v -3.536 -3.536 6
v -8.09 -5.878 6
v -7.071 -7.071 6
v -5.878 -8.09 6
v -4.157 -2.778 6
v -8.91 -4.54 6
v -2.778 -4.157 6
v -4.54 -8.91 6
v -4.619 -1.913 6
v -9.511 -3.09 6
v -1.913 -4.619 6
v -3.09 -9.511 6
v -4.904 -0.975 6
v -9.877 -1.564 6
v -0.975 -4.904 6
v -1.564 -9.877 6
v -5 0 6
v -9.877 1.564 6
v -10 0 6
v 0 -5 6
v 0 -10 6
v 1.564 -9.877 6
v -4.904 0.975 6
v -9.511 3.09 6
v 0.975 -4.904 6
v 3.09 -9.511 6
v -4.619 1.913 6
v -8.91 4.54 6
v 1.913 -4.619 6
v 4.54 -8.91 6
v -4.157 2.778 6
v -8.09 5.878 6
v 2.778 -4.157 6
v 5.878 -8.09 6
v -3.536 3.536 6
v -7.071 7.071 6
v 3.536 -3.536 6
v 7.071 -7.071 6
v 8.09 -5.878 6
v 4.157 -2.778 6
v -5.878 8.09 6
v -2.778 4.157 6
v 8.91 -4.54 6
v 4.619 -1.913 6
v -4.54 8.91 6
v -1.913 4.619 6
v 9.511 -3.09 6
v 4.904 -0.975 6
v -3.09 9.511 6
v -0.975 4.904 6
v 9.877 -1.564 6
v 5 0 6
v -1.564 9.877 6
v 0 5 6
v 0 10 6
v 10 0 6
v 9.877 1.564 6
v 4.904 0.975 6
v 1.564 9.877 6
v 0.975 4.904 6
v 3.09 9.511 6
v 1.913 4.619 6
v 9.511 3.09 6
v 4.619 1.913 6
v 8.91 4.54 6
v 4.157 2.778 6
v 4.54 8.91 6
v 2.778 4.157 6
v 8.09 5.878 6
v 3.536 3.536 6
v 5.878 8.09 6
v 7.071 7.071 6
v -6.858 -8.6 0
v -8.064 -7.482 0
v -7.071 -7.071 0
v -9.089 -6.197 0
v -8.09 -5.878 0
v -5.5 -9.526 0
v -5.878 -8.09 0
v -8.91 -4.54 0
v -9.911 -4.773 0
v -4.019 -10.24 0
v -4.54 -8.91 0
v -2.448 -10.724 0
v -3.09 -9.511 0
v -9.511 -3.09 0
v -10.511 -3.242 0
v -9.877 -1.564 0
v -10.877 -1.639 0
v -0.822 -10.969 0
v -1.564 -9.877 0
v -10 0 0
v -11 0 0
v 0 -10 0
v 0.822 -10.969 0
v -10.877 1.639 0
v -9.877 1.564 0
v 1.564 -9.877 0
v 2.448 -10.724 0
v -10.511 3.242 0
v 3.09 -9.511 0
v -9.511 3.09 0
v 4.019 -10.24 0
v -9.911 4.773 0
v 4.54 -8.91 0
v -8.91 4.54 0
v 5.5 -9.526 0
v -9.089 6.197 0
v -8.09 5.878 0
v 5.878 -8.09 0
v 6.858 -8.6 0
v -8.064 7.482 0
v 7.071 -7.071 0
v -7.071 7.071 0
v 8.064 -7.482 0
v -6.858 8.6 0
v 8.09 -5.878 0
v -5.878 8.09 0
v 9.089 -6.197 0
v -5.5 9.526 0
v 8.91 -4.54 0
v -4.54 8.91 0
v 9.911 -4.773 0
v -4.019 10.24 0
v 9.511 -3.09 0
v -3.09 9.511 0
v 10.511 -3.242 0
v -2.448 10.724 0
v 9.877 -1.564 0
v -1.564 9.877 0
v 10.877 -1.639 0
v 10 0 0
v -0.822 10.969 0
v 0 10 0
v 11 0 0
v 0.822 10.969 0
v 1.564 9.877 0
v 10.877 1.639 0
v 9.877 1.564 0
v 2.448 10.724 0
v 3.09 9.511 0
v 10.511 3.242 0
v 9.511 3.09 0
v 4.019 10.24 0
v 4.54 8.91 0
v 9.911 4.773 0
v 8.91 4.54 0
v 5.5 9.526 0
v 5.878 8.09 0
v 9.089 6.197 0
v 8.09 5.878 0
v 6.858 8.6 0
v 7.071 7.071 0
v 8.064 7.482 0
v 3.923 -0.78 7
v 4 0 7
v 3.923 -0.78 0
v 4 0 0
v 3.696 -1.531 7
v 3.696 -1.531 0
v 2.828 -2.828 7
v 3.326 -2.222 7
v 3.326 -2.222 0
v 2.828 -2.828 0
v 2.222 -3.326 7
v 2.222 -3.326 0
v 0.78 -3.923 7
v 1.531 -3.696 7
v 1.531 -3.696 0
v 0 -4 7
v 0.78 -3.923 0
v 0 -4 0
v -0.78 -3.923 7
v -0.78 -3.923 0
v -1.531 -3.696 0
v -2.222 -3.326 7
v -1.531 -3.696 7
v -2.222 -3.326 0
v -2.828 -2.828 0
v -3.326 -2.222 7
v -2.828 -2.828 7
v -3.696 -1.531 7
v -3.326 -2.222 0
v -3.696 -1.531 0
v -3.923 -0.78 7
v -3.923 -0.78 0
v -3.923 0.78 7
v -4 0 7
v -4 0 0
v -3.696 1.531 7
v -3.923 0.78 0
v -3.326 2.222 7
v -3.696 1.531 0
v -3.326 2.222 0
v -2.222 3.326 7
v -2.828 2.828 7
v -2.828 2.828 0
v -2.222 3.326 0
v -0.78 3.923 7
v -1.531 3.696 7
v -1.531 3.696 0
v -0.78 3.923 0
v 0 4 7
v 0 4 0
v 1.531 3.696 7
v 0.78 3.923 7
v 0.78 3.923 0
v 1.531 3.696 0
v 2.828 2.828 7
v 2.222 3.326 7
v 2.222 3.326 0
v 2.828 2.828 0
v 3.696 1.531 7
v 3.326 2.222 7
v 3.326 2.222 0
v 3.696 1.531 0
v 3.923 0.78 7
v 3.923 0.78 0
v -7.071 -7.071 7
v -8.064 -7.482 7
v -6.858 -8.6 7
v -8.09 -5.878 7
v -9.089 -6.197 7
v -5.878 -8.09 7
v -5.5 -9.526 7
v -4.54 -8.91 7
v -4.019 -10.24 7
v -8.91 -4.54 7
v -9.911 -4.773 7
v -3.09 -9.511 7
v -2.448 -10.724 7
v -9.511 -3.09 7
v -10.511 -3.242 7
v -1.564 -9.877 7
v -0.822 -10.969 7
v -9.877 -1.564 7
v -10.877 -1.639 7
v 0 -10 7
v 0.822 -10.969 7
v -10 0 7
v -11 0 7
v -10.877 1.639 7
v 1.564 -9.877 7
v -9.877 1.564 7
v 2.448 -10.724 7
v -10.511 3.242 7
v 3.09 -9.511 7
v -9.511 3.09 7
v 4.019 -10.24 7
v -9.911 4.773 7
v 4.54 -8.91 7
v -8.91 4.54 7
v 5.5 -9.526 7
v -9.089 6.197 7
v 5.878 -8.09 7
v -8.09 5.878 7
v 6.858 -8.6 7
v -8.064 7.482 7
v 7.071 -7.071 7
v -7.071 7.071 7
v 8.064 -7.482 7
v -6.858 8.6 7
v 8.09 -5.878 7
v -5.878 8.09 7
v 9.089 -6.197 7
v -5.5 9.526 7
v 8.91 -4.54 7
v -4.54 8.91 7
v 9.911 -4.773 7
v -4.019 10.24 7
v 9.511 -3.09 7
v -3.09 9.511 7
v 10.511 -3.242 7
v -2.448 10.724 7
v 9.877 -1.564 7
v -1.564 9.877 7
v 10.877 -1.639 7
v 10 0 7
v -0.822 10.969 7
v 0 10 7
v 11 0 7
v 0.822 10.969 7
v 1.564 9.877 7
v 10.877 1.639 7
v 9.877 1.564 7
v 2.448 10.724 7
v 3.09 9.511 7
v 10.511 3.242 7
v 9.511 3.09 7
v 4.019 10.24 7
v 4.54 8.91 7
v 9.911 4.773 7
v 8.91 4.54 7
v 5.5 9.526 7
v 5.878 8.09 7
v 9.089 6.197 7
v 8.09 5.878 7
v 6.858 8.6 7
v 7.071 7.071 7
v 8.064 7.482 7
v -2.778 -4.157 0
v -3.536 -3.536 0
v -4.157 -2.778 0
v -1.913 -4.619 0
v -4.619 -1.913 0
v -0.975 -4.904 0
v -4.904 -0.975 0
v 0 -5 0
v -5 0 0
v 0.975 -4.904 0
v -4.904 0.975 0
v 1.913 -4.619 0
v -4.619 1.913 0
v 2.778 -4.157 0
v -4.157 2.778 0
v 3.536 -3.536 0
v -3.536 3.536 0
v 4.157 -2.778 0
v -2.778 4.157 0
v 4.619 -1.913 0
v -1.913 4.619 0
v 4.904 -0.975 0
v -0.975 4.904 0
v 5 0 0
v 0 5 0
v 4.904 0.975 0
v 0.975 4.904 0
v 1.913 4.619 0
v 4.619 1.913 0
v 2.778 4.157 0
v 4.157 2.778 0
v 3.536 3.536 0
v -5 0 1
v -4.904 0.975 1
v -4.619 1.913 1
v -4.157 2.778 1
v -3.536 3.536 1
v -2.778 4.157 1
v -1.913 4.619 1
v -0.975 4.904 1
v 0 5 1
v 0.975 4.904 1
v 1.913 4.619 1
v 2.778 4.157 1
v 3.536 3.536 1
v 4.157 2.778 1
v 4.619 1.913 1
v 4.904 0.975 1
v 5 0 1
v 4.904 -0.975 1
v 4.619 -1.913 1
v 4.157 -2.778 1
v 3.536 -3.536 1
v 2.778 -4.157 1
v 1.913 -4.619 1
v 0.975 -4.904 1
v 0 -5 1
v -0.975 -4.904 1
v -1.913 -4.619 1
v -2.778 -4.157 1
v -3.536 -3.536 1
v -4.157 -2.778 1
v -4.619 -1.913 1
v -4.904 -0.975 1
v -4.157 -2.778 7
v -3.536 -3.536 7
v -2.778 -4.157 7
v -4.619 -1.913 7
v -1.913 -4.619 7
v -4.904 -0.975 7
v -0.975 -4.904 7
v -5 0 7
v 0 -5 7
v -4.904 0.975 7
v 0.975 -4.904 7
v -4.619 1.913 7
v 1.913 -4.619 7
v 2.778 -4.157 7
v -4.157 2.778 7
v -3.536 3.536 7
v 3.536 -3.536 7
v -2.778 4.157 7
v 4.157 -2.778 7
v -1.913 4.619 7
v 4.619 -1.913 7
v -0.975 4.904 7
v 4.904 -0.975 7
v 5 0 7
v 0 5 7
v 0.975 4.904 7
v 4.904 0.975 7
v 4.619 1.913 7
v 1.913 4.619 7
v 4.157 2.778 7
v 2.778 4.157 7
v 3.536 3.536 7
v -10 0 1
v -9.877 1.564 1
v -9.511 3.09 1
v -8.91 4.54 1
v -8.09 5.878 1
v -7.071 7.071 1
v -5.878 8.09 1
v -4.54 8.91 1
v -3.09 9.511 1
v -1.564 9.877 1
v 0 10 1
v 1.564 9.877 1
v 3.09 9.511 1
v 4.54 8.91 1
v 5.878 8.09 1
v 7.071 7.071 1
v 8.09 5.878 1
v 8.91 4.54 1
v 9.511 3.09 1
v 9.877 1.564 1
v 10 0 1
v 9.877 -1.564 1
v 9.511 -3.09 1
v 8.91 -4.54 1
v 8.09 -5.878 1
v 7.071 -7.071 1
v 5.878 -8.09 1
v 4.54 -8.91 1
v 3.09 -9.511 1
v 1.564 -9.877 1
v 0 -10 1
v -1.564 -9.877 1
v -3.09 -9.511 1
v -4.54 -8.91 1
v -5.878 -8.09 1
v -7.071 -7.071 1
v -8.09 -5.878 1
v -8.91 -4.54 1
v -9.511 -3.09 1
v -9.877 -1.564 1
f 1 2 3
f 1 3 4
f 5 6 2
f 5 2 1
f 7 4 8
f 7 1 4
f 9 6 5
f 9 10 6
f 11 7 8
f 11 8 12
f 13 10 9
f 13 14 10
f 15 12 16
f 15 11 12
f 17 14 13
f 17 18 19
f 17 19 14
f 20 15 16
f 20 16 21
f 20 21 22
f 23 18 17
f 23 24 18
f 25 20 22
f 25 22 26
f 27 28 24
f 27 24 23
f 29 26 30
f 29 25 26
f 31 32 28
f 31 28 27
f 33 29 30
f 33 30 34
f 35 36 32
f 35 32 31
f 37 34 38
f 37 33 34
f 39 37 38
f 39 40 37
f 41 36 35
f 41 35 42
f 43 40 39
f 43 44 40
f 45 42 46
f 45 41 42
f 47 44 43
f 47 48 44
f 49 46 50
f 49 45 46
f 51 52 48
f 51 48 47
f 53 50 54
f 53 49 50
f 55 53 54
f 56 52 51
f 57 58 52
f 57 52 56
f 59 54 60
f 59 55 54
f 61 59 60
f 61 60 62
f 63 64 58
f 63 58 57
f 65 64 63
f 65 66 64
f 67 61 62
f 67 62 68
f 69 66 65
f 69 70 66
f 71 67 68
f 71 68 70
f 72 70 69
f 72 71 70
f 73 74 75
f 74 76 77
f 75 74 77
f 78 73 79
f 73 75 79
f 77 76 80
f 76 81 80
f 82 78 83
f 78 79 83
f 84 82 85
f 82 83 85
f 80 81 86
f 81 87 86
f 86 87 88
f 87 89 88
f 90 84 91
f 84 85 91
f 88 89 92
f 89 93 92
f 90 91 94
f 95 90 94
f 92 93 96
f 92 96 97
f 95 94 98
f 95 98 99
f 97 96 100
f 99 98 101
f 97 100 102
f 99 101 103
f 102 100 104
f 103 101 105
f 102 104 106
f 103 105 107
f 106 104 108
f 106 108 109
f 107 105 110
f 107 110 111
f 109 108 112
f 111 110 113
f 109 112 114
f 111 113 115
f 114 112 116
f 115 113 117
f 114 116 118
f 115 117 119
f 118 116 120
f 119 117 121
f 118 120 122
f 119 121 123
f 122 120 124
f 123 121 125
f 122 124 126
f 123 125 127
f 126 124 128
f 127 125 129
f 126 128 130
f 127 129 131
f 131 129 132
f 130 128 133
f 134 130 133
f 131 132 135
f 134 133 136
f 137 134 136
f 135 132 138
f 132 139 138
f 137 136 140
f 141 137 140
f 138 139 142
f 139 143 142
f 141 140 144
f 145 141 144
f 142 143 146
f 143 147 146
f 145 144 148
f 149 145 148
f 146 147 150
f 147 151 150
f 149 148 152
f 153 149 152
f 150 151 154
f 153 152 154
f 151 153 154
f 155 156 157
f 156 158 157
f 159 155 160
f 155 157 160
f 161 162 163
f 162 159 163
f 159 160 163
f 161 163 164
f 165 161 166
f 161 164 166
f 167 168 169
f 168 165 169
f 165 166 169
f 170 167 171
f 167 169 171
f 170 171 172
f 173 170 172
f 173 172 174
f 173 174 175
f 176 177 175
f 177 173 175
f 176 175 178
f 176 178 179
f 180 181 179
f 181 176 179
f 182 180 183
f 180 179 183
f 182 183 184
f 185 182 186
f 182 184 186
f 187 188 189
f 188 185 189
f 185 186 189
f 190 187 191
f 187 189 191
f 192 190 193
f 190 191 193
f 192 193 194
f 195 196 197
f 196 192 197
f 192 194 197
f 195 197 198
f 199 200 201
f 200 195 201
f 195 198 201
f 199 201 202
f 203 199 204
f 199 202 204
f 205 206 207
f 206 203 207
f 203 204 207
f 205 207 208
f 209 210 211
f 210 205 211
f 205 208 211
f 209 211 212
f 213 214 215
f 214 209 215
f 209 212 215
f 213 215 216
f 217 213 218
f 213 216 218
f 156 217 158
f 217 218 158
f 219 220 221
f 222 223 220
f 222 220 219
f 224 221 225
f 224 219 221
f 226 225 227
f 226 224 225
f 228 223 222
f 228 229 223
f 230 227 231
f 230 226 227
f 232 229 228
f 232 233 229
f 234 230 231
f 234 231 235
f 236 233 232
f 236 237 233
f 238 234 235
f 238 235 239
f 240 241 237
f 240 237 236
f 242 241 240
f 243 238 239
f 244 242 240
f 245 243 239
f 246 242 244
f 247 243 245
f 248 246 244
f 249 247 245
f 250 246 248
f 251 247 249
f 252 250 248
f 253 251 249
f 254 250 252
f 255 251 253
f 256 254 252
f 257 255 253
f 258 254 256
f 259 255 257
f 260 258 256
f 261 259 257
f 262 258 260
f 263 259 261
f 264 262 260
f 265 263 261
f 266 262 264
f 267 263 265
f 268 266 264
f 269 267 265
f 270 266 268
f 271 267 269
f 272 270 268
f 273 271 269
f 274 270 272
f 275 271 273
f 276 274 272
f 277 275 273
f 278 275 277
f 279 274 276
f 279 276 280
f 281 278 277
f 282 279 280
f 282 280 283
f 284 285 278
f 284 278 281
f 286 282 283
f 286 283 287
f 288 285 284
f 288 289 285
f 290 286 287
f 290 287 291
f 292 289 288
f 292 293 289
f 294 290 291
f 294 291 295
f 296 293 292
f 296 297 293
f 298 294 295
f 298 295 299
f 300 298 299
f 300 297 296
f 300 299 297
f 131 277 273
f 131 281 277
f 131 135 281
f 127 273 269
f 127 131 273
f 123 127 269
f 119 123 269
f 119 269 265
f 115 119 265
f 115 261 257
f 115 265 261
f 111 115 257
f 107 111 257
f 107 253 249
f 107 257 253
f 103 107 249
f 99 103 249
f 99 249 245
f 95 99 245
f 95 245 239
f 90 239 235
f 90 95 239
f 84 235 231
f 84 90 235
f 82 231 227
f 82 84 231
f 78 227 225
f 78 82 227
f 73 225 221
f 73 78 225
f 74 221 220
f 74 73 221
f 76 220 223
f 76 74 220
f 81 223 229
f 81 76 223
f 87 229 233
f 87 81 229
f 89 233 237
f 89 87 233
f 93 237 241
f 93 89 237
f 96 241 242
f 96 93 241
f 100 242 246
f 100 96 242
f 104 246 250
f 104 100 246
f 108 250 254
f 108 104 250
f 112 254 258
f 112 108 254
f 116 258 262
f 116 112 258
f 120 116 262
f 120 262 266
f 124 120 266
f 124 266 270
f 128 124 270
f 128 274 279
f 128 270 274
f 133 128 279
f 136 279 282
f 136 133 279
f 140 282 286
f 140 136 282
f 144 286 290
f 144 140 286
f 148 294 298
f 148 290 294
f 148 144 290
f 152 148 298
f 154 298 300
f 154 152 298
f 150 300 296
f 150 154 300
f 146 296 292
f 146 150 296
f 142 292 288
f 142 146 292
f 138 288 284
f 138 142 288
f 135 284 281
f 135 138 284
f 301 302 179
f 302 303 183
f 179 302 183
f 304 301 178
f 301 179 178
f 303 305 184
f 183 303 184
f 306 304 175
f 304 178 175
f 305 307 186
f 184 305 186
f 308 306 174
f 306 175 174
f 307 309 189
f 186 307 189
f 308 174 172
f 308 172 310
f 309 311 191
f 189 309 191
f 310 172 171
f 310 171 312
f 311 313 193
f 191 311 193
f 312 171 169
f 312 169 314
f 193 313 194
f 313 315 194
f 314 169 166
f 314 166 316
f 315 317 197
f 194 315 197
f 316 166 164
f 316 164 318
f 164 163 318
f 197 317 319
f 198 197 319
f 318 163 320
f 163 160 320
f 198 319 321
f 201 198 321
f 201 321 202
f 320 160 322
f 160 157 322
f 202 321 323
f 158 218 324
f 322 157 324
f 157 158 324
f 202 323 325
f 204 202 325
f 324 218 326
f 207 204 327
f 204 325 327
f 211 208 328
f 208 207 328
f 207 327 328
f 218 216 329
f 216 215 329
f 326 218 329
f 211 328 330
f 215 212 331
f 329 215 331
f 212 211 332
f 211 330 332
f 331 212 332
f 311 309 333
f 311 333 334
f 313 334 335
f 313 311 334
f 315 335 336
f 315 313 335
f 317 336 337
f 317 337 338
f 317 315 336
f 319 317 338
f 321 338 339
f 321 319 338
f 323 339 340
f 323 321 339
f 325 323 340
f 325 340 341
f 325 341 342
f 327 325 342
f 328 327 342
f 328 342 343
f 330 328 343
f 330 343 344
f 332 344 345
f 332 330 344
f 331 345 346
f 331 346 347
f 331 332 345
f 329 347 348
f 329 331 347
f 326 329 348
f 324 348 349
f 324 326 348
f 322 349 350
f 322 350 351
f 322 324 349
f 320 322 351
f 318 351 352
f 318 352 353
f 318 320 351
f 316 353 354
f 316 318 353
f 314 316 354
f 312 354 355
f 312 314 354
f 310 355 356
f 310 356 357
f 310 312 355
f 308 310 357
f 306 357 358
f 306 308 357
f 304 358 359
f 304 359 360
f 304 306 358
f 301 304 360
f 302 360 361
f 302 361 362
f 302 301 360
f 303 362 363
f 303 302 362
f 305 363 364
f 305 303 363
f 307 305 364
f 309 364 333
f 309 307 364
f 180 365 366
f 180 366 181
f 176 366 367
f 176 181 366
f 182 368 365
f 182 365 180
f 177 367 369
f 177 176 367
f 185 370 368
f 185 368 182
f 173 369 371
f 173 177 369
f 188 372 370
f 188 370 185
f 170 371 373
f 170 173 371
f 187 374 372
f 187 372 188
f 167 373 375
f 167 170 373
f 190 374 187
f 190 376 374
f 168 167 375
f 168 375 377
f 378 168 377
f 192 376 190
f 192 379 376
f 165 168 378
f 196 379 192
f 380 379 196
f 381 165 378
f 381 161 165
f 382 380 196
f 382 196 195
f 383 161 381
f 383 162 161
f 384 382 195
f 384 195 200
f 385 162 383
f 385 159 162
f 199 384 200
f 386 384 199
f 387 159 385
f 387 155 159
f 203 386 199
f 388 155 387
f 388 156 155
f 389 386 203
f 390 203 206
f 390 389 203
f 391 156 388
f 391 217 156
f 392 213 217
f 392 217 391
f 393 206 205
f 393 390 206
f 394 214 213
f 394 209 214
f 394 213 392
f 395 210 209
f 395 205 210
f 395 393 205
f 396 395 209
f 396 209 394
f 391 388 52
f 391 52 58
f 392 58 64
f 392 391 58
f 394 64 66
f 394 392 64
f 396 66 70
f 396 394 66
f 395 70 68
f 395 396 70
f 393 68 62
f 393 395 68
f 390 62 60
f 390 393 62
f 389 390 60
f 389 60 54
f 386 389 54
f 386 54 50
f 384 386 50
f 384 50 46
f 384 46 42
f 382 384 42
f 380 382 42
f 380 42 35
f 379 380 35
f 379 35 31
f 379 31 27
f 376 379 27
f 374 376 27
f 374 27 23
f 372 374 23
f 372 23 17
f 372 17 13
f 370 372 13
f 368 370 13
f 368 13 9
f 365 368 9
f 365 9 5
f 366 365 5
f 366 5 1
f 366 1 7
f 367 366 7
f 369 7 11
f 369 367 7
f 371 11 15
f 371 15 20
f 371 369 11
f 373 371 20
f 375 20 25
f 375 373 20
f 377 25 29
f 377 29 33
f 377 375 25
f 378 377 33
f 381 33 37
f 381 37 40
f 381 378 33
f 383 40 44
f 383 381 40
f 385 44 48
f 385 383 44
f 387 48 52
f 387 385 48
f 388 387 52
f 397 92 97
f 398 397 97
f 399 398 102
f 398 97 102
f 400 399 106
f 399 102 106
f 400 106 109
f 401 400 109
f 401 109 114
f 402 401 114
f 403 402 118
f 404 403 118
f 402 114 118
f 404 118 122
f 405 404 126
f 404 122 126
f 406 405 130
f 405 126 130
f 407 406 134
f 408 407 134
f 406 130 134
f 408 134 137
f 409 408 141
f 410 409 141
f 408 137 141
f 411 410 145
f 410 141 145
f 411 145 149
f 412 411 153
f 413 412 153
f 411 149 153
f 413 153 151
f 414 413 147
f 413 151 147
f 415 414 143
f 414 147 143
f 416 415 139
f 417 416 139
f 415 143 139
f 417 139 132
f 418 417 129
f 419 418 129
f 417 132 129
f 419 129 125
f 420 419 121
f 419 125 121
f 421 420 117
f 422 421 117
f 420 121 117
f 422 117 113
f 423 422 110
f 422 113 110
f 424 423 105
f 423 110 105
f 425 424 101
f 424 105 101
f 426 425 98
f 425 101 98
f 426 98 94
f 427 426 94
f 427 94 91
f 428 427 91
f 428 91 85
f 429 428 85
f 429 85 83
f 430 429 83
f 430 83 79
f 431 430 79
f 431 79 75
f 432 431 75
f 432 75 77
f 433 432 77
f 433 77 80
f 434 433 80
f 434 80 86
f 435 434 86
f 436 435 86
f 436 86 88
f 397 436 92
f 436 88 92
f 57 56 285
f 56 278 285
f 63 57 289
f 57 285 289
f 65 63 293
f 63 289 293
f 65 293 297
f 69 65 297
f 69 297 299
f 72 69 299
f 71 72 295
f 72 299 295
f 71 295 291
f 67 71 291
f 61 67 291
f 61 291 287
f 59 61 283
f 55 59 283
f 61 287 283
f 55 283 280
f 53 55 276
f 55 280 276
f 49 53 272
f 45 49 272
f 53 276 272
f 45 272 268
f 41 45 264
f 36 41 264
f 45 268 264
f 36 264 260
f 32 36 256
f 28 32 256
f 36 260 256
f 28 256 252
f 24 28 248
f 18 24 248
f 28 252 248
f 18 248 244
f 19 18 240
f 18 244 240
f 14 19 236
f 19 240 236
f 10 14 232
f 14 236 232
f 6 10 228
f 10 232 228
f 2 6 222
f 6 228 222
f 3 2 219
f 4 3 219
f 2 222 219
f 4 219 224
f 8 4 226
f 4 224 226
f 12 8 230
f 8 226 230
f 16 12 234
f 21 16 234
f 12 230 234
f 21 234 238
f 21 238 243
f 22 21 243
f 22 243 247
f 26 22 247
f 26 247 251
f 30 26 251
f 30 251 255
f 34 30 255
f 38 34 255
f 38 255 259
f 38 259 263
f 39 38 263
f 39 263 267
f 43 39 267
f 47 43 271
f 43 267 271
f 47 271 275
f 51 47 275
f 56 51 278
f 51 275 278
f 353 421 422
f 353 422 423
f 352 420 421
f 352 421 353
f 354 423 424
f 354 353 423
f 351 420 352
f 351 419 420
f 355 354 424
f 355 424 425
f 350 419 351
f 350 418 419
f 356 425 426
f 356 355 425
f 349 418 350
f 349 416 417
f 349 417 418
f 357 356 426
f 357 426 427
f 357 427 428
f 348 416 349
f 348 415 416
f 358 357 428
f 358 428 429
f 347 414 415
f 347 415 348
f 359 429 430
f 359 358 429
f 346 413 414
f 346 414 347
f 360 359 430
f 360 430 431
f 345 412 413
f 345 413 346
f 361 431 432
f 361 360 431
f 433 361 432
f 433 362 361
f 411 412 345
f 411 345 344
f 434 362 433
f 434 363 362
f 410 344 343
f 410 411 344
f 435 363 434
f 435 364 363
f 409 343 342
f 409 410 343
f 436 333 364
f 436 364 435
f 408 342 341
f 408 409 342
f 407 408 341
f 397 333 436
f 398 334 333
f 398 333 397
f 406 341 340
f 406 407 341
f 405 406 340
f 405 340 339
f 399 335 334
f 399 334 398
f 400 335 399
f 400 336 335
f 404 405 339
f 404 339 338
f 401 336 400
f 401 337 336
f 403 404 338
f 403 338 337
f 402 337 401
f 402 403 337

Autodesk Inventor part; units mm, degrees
ref_plane "YZ Plane" through (0, 0, 0) normal (1, 0, 0) x (0, 1, 0)
ref_plane "XZ Plane" through (0, 0, 0) normal (0, 1, 0) x (-1, 0, 0)
ref_plane "XY Plane" through (0, 0, 0) normal (0, 0, 1) x (1, 0, 0)
sketch "Эскиз1" plane through (0, 0, 0) normal (0, 0, 1) x (1, 0, 0)
  circle A0 centre (0, 0) radius 4
  circle A1 centre (0, 0) radius 11
  dimension "d0" = 8
  dimension "d1" = 22
extrude "Выдавливание1" add sketch "Эскиз1" along normal blind 7
sketch "Эскиз3" plane through (0, 0, 7) normal (0, 0, 1) x (1, 0, 0)
  circle A0 centre (0, 0) radius 4 projected
  circle A1 centre (0, 0) radius 4
  circle A2 centre (0, 0) radius 5
  circle A3 centre (0, 0) radius 10
  circle A4 centre (0, 0) radius 11
  dimension "d8" = 10
  dimension "d9" = 20
  dimension "d10" = 22
  dimension "d11" = 8
extrude "Выдавливание3" cut sketch "Эскиз3" against normal blind 1 contours A3
sketch "Эскиз4" plane through (0, 0, 0) normal (0, 0, -1) x (-1, 0, 0)
  circle A0 centre (0, 0) radius 4
  circle A1 centre (0, 0) radius 5
  circle A2 centre (0, 0) radius 11
  circle A3 centre (0, 0) radius 10
  dimension "d14" = 20
  dimension "d15" = 8
  dimension "d16" = 10
  dimension "d17" = 22
extrude "Выдавливание4" cut sketch "Эскиз4" against normal blind 1 contours A3
properties part number "Подшипник"
